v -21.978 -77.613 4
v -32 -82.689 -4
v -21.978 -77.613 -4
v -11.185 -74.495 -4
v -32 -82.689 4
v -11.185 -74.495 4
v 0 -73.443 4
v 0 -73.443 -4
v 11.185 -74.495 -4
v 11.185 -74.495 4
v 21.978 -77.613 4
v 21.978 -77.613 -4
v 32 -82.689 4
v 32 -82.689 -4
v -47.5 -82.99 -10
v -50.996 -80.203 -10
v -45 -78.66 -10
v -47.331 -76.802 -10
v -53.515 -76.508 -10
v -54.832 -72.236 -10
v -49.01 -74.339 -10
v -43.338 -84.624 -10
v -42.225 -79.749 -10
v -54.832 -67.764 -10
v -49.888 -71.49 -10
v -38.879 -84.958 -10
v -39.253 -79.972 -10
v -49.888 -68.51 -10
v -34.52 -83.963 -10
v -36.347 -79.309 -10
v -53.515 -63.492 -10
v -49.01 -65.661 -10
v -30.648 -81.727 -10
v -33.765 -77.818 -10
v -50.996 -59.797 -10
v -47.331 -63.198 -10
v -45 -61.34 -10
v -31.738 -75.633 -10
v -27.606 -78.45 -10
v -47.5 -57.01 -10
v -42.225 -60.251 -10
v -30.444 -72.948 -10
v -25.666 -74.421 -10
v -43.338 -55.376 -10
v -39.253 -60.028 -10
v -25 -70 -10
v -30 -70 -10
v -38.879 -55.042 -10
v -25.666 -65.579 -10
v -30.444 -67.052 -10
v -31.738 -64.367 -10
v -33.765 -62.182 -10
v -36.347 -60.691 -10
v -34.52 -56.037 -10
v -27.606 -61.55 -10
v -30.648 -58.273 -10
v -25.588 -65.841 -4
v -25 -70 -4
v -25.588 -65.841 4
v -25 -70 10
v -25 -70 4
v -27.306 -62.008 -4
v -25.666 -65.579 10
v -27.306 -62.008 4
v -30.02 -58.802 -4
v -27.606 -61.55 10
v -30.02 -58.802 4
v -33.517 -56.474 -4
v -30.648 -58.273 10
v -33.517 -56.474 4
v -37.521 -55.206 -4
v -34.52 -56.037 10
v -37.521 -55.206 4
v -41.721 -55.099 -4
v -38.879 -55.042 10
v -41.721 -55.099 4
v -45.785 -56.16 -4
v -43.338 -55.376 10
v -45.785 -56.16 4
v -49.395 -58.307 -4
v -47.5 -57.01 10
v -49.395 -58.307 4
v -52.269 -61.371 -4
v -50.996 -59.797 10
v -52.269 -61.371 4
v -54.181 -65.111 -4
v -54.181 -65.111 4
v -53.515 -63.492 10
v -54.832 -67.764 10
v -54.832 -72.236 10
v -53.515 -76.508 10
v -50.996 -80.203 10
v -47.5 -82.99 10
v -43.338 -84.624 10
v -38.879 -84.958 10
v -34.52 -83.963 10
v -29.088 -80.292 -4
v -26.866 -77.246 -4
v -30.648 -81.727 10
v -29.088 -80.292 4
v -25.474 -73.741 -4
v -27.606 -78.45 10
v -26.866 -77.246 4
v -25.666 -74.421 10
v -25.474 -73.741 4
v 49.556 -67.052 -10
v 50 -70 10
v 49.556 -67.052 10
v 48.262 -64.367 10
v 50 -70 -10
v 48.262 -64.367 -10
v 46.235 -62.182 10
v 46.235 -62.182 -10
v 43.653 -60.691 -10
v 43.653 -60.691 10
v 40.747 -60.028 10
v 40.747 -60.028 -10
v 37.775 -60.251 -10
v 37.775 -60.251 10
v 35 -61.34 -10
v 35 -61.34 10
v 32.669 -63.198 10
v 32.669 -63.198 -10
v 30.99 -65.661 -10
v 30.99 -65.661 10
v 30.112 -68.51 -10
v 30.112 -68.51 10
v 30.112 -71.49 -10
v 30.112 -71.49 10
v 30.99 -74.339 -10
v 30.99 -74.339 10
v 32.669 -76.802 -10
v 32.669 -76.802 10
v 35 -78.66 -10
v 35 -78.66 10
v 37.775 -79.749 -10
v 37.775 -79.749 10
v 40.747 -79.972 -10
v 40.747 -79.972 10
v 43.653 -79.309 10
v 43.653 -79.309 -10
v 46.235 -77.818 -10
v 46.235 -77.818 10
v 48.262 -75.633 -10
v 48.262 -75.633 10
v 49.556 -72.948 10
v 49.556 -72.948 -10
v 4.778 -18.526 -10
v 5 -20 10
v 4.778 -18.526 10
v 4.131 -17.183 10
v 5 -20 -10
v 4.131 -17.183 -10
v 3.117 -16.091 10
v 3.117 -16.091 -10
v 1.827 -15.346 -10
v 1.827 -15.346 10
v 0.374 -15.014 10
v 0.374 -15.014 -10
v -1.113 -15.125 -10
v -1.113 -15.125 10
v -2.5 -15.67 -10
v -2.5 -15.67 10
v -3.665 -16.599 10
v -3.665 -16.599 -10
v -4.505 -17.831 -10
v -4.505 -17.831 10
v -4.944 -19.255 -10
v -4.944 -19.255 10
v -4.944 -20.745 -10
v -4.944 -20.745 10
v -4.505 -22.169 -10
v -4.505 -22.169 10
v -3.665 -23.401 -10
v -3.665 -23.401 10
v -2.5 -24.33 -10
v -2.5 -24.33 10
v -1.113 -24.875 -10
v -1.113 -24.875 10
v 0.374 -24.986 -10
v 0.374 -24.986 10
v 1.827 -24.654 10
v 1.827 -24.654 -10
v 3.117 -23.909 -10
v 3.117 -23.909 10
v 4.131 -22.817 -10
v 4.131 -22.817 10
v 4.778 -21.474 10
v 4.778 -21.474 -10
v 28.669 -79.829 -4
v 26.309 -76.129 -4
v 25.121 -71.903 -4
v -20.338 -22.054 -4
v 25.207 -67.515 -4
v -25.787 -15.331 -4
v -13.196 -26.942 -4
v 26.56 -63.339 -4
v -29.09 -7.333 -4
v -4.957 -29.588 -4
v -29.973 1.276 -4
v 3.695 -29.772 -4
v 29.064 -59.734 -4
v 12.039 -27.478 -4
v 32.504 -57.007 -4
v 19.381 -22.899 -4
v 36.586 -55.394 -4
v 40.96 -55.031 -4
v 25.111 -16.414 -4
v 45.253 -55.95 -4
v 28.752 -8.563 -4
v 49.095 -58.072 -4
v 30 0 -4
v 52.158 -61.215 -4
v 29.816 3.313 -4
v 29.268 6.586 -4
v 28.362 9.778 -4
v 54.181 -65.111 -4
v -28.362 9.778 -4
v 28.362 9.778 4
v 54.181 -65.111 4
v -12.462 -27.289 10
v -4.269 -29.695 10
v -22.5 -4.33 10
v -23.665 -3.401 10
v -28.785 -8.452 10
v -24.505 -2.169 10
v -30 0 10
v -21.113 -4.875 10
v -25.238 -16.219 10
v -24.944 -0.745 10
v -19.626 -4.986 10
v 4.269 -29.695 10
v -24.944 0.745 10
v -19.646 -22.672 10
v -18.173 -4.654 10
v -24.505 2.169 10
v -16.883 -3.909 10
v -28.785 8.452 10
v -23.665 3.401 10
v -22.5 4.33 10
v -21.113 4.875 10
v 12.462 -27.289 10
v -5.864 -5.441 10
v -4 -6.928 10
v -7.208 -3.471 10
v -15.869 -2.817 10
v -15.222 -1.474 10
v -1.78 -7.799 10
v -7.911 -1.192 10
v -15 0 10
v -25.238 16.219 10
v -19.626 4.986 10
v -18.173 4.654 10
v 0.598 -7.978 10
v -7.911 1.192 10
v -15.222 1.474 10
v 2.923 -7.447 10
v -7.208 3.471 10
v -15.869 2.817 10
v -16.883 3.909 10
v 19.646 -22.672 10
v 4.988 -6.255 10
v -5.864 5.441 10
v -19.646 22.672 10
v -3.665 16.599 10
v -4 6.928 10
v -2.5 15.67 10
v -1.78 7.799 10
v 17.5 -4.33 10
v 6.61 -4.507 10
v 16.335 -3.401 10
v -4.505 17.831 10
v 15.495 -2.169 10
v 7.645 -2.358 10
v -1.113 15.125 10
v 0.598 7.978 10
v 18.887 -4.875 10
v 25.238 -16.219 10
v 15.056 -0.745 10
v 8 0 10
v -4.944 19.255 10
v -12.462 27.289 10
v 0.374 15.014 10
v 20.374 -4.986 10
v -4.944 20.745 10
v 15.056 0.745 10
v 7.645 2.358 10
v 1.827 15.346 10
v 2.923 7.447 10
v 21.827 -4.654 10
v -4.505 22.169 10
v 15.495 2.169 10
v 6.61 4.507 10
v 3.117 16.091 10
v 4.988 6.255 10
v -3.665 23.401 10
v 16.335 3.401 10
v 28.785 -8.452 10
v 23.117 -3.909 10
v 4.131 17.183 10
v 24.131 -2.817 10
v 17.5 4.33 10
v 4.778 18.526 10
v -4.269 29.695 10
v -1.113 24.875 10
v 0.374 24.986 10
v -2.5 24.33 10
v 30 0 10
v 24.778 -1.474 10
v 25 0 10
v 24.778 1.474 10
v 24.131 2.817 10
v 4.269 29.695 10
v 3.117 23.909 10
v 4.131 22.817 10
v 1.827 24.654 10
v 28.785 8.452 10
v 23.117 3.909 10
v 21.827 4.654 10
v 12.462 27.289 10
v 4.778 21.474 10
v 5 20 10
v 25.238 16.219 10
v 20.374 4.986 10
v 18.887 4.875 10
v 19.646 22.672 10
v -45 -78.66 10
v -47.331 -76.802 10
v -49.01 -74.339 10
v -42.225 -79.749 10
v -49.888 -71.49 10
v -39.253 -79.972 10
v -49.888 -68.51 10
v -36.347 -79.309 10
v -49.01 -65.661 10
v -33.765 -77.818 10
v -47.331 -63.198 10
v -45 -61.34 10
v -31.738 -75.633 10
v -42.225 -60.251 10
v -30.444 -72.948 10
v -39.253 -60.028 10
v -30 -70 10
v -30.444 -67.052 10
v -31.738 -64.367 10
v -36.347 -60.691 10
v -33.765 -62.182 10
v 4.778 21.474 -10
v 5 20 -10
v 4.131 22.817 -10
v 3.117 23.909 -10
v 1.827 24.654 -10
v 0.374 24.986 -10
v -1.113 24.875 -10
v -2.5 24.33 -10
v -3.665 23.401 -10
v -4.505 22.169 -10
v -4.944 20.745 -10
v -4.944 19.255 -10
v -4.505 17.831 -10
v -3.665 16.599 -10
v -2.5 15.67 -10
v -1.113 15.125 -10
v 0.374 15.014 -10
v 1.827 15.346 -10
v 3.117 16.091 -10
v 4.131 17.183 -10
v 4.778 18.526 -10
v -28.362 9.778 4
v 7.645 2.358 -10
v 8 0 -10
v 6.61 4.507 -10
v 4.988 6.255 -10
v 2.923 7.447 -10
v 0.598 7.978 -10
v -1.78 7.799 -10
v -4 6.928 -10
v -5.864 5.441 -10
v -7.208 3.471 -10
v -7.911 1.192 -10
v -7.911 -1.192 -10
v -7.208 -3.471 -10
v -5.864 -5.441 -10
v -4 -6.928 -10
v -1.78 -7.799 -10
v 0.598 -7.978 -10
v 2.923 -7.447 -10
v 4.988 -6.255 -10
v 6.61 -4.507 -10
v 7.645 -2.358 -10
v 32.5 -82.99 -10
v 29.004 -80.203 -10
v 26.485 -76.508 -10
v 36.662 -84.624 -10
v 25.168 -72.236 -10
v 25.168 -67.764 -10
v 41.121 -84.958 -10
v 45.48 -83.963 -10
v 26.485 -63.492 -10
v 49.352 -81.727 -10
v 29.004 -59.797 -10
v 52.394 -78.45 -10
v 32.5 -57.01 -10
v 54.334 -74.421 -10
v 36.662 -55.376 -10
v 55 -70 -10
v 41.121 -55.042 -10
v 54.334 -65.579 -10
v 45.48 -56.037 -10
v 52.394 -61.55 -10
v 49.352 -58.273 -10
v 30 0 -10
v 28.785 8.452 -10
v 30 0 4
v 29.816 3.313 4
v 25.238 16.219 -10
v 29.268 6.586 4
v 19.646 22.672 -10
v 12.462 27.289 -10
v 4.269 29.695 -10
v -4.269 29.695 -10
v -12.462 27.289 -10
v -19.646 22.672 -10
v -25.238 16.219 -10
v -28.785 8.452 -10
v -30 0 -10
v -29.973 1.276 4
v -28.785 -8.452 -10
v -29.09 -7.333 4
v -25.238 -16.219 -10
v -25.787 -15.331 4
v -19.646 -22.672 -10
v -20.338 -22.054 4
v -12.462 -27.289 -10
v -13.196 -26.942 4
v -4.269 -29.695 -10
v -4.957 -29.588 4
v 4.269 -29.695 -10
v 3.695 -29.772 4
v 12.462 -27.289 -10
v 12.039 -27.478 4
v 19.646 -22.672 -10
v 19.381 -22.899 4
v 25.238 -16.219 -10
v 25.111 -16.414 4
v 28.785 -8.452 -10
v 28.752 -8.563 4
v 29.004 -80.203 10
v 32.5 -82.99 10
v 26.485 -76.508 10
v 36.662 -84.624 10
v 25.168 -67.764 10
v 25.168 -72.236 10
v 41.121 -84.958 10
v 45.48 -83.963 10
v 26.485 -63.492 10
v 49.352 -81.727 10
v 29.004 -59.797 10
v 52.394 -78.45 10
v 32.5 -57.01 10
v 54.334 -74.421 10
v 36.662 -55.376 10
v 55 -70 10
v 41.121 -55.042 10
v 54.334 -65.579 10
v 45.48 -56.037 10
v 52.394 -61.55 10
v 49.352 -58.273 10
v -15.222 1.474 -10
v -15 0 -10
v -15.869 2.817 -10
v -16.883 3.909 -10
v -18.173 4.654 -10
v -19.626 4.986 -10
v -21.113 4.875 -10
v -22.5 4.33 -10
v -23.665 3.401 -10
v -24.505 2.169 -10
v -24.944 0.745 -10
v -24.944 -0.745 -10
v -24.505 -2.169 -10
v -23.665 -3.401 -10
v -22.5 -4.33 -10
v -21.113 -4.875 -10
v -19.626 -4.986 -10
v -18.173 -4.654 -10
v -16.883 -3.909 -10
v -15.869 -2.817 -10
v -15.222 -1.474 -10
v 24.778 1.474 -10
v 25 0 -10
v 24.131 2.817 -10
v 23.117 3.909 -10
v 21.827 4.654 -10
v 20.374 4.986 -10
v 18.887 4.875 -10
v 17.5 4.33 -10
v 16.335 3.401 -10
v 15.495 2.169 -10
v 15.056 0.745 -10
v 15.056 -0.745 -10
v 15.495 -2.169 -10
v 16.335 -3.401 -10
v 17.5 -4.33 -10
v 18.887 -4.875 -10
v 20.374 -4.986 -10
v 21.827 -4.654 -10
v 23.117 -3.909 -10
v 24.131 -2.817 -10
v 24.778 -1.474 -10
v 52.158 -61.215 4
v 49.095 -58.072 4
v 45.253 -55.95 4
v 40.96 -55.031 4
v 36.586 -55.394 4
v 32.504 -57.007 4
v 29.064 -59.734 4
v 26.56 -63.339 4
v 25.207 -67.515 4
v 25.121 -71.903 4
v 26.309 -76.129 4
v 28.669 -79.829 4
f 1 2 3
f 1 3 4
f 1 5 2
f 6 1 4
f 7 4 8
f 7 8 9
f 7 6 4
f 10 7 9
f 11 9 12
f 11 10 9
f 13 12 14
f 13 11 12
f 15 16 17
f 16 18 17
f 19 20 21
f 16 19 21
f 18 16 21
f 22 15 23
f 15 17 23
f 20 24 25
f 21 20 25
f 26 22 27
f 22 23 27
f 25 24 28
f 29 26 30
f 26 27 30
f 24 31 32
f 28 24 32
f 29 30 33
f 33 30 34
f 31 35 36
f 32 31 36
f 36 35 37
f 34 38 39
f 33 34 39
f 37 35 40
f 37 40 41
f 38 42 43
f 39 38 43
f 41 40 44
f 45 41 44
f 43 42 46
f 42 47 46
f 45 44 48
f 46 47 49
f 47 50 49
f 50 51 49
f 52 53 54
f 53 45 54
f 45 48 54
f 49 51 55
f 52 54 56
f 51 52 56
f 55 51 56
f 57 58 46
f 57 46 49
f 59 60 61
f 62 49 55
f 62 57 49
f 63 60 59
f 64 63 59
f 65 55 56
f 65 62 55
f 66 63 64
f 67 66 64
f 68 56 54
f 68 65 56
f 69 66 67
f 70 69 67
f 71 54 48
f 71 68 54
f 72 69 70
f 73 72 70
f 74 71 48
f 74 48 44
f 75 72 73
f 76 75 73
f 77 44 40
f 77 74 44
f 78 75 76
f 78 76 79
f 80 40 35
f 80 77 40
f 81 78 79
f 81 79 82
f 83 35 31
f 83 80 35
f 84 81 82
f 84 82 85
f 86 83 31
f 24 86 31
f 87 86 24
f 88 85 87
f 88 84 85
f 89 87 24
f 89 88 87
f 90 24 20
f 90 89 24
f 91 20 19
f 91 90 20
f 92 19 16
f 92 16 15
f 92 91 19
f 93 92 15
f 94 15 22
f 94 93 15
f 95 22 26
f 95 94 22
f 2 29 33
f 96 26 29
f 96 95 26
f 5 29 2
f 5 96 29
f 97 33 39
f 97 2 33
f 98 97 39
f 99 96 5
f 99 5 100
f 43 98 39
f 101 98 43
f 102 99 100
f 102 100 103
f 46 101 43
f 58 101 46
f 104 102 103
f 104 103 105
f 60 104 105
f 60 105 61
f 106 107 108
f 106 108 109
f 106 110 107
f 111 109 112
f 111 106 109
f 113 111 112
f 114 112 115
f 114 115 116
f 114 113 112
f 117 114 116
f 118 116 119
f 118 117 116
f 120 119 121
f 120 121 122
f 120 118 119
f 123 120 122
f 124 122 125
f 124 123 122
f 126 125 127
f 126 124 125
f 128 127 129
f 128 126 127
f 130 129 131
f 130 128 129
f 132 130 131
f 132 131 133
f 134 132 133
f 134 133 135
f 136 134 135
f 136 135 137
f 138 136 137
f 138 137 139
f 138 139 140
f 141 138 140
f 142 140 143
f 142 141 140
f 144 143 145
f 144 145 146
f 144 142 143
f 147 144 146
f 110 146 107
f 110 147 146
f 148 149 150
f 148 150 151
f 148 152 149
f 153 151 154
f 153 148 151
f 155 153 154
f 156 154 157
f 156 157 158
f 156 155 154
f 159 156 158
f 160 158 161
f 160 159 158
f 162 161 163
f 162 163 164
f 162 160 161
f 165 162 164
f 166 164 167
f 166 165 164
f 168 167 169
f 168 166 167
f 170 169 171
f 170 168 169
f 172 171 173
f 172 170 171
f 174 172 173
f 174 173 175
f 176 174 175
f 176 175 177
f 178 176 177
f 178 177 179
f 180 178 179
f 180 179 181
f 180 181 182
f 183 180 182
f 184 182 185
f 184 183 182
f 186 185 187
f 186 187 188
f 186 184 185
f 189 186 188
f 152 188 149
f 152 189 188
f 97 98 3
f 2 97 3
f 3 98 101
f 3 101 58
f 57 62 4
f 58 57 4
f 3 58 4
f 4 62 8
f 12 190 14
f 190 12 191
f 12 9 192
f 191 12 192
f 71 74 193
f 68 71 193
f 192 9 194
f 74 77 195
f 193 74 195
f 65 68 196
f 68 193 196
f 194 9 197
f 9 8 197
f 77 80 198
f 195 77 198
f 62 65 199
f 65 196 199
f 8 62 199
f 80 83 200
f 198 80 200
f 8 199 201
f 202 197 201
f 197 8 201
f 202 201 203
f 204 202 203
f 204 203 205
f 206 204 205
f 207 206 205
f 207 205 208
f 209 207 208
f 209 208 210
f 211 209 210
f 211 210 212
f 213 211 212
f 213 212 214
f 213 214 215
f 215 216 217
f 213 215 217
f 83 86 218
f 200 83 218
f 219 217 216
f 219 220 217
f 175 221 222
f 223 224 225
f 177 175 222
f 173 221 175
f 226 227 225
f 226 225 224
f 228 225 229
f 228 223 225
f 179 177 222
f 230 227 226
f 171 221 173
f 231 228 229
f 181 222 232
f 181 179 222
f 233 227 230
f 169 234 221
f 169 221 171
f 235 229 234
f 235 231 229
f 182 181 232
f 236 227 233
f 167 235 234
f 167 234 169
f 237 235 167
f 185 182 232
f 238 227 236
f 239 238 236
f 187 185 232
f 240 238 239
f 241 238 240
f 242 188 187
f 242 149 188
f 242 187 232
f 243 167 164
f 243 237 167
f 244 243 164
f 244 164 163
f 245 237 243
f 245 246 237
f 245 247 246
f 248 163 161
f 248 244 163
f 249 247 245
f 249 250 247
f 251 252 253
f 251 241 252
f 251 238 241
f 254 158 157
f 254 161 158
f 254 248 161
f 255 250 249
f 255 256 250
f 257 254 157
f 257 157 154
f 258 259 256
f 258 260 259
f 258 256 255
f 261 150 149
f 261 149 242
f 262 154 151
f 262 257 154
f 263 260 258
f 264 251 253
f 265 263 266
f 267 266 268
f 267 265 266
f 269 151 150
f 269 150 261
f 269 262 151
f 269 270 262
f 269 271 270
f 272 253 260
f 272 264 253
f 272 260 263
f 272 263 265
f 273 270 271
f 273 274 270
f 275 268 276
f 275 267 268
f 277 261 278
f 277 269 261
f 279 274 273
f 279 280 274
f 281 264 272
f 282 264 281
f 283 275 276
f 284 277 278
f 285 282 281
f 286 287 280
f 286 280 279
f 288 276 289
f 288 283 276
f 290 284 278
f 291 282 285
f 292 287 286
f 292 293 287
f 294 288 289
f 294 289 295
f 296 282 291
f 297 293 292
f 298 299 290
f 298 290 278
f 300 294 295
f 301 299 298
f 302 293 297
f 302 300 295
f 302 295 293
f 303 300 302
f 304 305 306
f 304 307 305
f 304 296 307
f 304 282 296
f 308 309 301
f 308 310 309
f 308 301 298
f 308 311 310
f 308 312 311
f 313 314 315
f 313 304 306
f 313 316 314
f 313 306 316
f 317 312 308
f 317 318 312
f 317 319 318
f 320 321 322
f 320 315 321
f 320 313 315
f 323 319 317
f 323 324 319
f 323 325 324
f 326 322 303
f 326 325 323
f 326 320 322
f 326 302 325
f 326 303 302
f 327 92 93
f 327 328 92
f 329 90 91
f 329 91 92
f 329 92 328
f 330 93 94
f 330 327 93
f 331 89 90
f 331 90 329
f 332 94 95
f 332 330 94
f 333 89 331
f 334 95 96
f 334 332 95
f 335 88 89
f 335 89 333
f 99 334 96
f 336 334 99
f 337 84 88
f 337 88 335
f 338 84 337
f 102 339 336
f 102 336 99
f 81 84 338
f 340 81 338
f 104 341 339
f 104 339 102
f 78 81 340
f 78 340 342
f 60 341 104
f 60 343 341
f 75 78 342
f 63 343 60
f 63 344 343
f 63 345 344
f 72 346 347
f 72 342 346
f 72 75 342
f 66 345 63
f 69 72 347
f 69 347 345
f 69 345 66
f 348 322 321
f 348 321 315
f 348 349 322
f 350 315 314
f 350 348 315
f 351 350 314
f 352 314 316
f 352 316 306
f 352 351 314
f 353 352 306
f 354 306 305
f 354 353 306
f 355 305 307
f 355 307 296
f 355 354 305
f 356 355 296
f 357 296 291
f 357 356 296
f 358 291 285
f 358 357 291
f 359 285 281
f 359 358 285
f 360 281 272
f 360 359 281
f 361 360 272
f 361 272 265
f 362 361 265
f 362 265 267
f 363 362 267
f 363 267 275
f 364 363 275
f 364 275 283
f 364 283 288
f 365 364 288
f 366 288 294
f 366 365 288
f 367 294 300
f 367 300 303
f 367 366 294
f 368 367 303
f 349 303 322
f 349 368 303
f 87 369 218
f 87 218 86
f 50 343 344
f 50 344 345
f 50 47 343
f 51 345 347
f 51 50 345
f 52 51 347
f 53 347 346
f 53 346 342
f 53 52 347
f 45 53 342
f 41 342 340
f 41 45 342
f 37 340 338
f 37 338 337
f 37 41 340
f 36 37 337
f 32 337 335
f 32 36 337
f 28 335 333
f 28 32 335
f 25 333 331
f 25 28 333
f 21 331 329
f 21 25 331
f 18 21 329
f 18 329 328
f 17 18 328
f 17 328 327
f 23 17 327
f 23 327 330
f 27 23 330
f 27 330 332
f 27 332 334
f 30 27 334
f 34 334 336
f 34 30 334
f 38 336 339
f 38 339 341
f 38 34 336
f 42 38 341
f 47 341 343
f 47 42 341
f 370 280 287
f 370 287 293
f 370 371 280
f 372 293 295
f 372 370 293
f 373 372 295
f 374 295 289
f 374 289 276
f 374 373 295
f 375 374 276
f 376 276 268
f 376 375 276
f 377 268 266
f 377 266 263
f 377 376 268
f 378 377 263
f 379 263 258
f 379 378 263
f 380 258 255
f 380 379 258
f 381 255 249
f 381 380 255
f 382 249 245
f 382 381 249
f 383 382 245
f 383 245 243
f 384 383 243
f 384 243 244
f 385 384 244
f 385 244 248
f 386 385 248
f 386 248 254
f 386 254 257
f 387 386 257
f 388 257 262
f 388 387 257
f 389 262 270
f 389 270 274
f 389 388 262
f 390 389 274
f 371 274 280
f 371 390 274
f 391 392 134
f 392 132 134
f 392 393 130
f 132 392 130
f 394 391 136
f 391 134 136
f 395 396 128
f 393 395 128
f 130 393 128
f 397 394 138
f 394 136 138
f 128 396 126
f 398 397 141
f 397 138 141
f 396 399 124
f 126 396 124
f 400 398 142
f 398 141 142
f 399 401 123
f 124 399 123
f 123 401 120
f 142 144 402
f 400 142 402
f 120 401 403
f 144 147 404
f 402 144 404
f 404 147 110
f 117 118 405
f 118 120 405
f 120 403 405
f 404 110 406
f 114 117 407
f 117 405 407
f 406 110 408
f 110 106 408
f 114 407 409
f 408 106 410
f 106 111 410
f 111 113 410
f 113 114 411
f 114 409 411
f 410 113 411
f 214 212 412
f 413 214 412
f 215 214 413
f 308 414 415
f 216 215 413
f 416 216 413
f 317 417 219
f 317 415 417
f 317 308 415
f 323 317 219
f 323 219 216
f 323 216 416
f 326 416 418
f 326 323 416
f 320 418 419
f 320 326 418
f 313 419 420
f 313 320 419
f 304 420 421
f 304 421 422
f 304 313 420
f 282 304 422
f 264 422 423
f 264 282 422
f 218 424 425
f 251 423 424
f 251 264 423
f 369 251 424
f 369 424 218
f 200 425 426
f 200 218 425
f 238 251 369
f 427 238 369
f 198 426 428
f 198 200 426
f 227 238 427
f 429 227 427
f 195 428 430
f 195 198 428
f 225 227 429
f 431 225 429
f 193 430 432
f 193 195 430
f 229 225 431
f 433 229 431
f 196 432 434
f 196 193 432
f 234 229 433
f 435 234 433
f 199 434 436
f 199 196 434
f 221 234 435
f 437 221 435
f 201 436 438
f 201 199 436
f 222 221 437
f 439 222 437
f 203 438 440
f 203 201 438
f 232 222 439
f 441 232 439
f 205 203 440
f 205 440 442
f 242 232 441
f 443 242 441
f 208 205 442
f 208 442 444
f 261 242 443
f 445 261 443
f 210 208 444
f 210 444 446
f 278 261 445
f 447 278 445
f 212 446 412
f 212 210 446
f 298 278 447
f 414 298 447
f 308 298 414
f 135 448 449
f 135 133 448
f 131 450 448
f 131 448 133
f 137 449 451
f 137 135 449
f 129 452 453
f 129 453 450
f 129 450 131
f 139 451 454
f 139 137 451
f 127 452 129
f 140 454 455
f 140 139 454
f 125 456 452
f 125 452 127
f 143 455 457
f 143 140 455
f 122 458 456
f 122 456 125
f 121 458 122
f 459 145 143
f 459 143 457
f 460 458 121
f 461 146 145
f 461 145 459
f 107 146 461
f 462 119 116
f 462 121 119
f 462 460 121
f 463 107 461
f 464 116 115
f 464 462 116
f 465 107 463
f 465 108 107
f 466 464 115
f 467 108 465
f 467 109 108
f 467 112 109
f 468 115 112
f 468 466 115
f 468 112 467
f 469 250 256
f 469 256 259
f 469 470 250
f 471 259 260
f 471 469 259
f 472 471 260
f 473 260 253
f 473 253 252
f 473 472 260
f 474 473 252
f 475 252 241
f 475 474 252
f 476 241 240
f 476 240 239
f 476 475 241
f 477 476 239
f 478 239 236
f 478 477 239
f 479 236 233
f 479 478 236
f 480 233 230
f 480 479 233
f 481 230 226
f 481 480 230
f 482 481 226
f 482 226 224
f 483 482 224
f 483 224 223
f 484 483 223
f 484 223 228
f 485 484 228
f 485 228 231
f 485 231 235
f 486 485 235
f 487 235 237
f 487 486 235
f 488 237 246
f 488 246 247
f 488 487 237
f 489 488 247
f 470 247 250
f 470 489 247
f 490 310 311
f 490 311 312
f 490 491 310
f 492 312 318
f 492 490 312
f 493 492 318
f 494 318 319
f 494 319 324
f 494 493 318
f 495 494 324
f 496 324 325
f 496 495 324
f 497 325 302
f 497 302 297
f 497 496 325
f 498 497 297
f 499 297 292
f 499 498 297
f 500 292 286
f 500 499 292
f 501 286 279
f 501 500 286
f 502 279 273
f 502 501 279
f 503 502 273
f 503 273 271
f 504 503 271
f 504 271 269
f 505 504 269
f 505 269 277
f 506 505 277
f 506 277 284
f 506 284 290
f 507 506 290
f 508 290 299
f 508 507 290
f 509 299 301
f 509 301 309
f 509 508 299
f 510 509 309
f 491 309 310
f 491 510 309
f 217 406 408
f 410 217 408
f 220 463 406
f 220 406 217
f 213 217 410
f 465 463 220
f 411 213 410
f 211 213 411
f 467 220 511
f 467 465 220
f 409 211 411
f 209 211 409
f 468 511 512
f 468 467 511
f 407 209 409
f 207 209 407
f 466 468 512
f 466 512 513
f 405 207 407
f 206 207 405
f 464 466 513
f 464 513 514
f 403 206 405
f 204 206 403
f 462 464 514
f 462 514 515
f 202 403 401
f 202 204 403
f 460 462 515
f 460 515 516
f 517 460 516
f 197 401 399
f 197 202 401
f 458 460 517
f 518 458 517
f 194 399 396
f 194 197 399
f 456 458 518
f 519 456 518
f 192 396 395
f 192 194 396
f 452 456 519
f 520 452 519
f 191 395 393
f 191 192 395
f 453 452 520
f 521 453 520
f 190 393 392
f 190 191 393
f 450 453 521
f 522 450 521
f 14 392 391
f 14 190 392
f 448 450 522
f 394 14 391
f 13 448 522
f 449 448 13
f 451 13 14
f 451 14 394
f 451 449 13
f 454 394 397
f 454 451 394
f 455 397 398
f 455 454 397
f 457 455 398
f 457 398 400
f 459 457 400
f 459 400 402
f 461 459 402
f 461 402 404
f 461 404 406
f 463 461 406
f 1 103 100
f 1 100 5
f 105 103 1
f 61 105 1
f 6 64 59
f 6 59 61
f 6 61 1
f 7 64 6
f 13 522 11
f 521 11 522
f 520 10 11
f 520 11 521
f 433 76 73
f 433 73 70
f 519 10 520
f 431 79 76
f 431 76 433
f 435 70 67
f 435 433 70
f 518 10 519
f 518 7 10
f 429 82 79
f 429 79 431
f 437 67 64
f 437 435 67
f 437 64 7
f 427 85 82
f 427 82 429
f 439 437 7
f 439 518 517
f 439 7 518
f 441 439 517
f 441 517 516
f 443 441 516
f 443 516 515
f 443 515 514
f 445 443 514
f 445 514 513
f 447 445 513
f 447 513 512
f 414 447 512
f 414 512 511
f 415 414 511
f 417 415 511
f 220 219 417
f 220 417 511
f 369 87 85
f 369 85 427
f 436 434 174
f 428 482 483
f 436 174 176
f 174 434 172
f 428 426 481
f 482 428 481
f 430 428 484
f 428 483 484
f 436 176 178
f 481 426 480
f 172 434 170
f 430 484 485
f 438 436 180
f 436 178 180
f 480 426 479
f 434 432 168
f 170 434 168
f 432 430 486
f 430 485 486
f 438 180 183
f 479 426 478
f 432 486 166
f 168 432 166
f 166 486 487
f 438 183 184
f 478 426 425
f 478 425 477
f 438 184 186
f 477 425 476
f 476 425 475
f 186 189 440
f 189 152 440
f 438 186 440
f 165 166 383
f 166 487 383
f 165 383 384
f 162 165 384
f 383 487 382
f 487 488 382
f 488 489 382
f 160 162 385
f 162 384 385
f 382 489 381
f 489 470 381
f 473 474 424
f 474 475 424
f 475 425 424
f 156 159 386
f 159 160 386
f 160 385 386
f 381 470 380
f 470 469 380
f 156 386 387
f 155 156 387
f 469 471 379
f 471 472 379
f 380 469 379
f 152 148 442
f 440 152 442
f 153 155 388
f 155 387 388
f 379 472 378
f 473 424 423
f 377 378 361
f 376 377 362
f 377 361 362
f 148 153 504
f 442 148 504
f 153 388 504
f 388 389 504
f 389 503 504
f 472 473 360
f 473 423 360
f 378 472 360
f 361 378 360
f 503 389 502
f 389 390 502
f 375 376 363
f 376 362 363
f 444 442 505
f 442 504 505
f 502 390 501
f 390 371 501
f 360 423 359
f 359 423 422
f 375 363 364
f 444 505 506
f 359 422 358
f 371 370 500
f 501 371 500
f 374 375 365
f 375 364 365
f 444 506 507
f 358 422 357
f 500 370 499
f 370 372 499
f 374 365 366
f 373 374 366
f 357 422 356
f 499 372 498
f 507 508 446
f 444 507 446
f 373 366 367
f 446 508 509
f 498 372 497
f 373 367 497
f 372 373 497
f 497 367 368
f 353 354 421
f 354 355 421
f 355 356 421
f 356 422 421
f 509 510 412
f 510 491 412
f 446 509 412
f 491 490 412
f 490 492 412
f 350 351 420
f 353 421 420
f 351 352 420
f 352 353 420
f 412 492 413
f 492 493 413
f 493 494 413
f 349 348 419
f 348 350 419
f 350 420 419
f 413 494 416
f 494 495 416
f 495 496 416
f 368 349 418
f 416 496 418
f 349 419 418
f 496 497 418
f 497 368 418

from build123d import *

# Parameters (mm, degrees)
SKETCH1_R             = 30
SKETCH1_R_2           = 8
SKETCH1_R_3           = 5
BOSS_EXTRUDE1_DEPTH   = 10
SKETCH1_R_4           = 15
SKETCH1_R_5           = 10
BOSS_EXTRUDE1_2_DEPTH = 10
BOSS_EXTRUDE1_3_DEPTH = 10
BOSS_EXTRUDE2_DEPTH   = 4


with BuildPart() as part:
    # Sketch1 → Boss-Extrude1 (new, symmetric)
    with BuildSketch(Plane.XY):
        Circle(SKETCH1_R)
        Circle(SKETCH1_R_2, mode=Mode.SUBTRACT)
        with Locations((20, 0)):
            Circle(SKETCH1_R_3, mode=Mode.SUBTRACT)
        with Locations((0, -20)):
            Circle(SKETCH1_R_3, mode=Mode.SUBTRACT)
        with Locations((-20, 0)):
            Circle(SKETCH1_R_3, mode=Mode.SUBTRACT)
        with Locations((0, 20)):
            Circle(SKETCH1_R_3, mode=Mode.SUBTRACT)
    extrude(amount=BOSS_EXTRUDE1_DEPTH, both=True)



with BuildPart() as body_2:
    # Sketch1 → Boss-Extrude1 2 (new, symmetric)
    with BuildSketch(Plane.XY):
        with Locations((40, -70)):
            Circle(SKETCH1_R_4)
        with Locations((40, -70)):
            Circle(SKETCH1_R_5, mode=Mode.SUBTRACT)
    extrude(amount=BOSS_EXTRUDE1_2_DEPTH, both=True)


with BuildPart() as body_3:
    # Sketch1 → Boss-Extrude1 3 (new, symmetric)
    with BuildSketch(Plane.XY):
        with Locations((-40, -70)):
            Circle(SKETCH1_R_4)
        with Locations((-40, -70)):
            Circle(SKETCH1_R_5, mode=Mode.SUBTRACT)
    extrude(amount=BOSS_EXTRUDE1_3_DEPTH, both=True)


with BuildPart() as part_1:
    add(part.part)

    add(body_2.part)  # Boss-Extrude2 merges body 2

    add(body_3.part)  # Boss-Extrude2 merges body 3
    # Sketch1<3> → Boss-Extrude2 (add, symmetric)
    with BuildSketch(Plane.XY):
        with BuildLine():
            Line((54.180868072, -65.11093253), (28.361736144, 9.778134939))
            ThreePointArc((28.361736144, 9.778134939), (29.587599466, 4.957212709), (30, 0))
            ThreePointArc((30, 0), (-4.957212709, -29.587599466), (-28.361736144, 9.778134939))
            Line((-28.361736144, 9.778134939), (-54.180868072, -65.11093253))
            ThreePointArc((-54.180868072, -65.11093253), (-37.521393646, -55.206200267), (-25, -70))
            ThreePointArc((-25, -70), (-26.866074463, -77.245688373), (-32, -82.68857754))
            ThreePointArc((-32, -82.68857754), (0, -73.442887702), (32, -82.68857754))
            ThreePointArc((32, -82.68857754), (30.683660399, -58.24390301), (54.180868072, -65.11093253))
        make_face()
    extrude(amount=BOSS_EXTRUDE2_DEPTH, both=True)


solid = part_1.part
